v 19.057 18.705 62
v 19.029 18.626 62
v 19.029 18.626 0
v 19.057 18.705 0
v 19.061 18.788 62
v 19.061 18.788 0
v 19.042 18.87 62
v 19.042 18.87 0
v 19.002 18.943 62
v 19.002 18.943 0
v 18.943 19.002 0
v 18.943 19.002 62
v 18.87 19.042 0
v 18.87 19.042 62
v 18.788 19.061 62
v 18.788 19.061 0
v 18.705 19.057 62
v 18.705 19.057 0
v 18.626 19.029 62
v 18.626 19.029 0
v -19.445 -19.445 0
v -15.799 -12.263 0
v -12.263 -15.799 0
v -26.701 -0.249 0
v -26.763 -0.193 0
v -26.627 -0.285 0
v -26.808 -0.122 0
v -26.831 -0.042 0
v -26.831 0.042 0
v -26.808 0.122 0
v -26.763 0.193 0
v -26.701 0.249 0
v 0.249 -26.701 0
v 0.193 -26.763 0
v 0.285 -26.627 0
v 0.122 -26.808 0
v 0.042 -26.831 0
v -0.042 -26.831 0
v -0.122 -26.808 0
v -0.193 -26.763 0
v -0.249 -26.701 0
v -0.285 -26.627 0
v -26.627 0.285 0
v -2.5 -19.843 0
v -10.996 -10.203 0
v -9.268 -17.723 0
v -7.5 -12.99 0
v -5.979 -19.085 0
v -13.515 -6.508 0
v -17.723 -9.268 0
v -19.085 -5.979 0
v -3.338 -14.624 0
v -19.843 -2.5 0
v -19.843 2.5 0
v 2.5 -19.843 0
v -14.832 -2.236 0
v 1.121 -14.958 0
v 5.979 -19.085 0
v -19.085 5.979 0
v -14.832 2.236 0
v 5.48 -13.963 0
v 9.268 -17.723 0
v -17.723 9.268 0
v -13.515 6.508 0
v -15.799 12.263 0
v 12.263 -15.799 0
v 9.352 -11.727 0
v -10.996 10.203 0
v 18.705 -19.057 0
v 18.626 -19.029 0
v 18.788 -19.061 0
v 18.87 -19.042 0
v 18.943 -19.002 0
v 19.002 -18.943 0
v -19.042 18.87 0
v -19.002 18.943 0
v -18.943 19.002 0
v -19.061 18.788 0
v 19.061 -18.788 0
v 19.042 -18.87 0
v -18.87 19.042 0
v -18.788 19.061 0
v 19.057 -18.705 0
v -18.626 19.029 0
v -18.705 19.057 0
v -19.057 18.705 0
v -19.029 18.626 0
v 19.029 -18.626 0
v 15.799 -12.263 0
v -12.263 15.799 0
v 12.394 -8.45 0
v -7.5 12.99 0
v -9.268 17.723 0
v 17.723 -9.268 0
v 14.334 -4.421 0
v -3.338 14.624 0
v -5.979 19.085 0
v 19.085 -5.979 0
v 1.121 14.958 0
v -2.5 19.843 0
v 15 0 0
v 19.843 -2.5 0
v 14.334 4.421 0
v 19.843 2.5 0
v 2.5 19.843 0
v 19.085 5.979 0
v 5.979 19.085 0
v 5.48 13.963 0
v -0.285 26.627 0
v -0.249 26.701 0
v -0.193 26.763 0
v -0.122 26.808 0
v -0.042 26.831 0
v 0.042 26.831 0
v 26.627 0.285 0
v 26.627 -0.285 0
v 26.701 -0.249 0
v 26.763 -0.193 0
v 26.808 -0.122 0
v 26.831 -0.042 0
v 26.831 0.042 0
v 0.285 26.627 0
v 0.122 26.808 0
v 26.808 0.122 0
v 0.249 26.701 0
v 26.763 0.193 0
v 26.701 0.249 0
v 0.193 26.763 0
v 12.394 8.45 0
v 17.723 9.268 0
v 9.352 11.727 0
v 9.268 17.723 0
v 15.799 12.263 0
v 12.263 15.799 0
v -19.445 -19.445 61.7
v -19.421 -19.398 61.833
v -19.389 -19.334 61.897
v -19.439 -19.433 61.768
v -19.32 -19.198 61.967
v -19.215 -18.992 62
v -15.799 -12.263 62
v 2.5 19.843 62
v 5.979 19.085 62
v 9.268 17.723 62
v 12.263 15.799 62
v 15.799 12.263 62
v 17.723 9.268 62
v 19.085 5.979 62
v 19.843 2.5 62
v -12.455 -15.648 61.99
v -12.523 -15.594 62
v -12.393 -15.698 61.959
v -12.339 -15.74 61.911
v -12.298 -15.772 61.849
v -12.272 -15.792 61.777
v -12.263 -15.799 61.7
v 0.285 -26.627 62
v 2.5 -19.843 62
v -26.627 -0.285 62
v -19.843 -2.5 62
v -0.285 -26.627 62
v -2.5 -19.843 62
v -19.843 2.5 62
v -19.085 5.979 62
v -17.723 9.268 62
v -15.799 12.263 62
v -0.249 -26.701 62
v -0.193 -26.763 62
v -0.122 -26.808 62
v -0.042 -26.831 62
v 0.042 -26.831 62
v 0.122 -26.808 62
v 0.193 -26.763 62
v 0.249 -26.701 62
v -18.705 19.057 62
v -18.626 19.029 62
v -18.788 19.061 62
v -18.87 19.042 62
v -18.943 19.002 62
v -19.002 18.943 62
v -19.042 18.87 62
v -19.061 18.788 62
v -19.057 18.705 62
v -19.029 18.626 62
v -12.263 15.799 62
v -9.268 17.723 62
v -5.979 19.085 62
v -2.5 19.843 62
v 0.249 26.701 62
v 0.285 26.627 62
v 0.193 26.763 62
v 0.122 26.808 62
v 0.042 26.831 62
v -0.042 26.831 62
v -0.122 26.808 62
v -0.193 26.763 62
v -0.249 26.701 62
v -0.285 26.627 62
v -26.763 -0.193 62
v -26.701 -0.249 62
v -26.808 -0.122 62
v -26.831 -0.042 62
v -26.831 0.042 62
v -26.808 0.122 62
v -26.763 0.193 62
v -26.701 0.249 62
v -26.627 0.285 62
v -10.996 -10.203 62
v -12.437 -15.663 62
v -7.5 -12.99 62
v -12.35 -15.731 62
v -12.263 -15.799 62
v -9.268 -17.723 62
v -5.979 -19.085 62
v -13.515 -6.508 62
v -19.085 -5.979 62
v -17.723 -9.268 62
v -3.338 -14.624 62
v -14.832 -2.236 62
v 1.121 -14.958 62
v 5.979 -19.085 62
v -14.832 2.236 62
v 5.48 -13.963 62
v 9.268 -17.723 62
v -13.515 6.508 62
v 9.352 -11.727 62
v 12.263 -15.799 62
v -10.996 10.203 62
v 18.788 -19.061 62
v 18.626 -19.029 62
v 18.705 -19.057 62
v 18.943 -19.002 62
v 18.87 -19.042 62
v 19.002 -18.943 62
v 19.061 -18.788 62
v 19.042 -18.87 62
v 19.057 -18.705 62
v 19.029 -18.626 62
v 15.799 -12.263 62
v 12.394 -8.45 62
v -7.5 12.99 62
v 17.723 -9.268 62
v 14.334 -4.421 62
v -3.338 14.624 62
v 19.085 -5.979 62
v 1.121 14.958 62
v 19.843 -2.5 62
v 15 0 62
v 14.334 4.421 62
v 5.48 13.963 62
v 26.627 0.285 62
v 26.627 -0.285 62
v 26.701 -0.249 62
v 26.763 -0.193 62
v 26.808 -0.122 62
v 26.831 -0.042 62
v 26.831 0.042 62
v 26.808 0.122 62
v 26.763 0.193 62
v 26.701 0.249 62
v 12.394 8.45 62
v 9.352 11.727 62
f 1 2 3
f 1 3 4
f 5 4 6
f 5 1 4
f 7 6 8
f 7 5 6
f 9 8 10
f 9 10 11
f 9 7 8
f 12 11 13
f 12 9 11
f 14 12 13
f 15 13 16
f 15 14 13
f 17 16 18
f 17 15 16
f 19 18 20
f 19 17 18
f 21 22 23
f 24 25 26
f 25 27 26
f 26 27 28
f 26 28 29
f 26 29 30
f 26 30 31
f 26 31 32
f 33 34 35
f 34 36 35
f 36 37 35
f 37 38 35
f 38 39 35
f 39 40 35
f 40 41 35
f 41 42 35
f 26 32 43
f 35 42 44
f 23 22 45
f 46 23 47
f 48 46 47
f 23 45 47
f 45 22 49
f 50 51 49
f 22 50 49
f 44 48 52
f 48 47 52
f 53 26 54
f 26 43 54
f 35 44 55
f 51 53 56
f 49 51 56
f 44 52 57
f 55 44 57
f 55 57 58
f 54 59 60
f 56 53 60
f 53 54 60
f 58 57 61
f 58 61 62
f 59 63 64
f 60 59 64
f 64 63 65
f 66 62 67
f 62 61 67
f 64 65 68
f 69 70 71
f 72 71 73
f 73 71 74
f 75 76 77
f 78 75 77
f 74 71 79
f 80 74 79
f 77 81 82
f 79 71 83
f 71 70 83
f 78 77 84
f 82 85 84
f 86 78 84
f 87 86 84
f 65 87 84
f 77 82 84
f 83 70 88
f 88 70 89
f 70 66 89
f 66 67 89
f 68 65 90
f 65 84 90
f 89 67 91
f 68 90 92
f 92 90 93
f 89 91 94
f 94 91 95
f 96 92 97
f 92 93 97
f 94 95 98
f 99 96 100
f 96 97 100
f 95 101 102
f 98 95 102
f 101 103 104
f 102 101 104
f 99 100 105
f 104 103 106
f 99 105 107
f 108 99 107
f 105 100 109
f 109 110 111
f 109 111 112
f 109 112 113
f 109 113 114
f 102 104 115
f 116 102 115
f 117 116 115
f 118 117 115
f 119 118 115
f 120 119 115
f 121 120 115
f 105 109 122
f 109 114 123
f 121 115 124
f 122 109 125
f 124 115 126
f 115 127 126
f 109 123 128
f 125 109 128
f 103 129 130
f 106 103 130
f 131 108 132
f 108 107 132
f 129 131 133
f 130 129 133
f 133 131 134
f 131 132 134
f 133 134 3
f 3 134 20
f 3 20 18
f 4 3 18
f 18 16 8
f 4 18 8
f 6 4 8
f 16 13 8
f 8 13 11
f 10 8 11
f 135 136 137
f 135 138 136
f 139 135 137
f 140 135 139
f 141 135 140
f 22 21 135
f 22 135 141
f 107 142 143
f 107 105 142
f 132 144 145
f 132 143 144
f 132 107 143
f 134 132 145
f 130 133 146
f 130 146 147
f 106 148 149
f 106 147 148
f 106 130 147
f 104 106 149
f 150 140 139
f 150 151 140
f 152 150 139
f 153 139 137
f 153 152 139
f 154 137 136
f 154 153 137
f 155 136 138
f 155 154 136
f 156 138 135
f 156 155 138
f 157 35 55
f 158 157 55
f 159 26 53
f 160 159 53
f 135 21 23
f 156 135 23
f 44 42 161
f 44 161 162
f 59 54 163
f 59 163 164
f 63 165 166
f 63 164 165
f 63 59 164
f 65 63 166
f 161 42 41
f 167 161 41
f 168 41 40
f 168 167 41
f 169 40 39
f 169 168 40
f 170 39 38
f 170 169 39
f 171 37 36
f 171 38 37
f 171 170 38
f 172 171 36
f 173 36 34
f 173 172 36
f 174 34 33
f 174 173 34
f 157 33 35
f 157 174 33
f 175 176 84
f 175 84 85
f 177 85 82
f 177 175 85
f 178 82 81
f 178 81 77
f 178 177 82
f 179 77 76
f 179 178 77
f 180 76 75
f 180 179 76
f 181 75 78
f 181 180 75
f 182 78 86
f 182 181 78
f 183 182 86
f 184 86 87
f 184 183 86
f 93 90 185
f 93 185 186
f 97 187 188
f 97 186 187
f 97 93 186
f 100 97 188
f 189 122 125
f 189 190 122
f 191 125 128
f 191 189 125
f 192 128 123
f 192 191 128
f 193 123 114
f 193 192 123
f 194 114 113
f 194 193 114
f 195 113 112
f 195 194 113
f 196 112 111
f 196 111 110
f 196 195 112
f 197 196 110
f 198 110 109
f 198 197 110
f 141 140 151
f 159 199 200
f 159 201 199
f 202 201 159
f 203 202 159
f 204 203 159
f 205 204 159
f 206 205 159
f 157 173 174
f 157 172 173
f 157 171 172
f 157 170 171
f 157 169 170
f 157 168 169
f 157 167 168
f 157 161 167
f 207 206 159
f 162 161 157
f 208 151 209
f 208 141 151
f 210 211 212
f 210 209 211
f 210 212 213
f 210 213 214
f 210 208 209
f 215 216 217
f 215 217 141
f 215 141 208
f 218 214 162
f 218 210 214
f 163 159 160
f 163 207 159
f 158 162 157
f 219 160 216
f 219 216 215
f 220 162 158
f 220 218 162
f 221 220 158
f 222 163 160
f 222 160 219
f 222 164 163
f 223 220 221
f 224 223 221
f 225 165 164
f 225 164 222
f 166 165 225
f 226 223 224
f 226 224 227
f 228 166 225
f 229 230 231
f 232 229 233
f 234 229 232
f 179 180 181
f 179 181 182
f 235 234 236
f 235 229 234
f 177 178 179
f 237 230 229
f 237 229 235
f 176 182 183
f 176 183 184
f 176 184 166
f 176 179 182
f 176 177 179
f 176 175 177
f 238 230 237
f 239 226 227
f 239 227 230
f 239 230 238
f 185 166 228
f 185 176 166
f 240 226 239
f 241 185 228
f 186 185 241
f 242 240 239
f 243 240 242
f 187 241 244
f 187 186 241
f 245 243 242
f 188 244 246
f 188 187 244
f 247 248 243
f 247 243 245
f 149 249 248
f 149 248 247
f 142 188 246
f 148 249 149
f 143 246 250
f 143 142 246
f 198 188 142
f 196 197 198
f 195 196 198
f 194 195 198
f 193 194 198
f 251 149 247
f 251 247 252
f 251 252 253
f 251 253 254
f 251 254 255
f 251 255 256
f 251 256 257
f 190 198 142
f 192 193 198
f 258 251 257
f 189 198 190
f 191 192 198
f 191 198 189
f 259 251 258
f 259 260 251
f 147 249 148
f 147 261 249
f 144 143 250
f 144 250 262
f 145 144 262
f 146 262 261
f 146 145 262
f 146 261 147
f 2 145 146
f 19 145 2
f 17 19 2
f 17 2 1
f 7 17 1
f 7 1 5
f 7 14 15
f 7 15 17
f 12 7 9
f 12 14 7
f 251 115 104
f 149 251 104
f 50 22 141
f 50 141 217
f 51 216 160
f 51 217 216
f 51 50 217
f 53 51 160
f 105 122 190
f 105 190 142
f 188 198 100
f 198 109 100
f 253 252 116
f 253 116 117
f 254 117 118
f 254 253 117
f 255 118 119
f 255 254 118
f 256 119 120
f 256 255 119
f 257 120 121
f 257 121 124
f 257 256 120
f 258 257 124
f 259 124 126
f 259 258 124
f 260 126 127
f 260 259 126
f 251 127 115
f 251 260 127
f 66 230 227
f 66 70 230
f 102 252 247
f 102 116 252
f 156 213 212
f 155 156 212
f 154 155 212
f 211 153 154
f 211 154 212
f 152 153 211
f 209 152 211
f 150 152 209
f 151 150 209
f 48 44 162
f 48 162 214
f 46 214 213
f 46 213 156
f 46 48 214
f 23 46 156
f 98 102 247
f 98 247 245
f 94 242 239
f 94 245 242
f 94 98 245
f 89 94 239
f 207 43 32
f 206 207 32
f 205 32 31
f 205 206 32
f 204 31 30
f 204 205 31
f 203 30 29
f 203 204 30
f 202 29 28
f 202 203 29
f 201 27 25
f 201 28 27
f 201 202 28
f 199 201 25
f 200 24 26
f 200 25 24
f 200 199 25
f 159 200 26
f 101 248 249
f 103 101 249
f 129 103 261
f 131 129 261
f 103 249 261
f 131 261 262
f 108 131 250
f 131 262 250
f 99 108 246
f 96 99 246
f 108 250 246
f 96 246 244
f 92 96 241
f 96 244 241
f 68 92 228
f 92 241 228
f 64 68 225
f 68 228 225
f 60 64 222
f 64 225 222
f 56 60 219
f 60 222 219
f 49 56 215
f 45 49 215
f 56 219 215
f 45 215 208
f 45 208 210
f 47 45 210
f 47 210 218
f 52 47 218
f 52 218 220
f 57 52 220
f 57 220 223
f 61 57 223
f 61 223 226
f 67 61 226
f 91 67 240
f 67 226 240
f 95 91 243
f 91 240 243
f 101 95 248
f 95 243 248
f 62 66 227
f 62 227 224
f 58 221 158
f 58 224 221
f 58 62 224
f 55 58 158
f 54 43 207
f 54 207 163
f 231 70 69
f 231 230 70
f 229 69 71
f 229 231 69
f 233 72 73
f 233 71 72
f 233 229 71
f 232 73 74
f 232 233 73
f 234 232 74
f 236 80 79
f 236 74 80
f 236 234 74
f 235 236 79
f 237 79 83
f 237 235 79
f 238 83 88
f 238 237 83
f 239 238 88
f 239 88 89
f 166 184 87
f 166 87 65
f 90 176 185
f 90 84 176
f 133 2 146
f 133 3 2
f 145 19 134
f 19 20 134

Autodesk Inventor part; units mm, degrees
ref_plane "YZ Plane" through (0, 0, 0) normal (1, 0, 0) x (0, 1, 0)
ref_plane "XZ Plane" through (0, 0, 0) normal (0, 1, 0) x (-1, 0, 0)
ref_plane "XY Plane" through (0, 0, 0) normal (0, 0, 1) x (1, 0, 0)
sketch "草图1" plane through (0, 0, 0) normal (0, 0, 1) x (1, 0, 0)
  circle A0 centre (0, 0) radius 27.5
  line L0 (27.5, 0) -> (19.8431, 2.5)
  line L1 (0, 0) -> (42.7409, 0) construction
  line L2 (27.5, 0) -> (19.8431, -2.5)
  line L3 (19.4454, 19.4454) -> (12.2634, 15.799)
  line L4 (19.4454, 19.4454) -> (15.799, 12.2634)
  line L5 (0, 27.5) -> (-2.5, 19.8431)
  line L6 (0, 27.5) -> (2.5, 19.8431)
  line L7 (-19.4454, 19.4454) -> (-15.799, 12.2634)
  line L8 (-19.4454, 19.4454) -> (-12.2634, 15.799)
  line L9 (-27.5, 0) -> (-19.8431, -2.5)
  line L10 (-27.5, 0) -> (-19.8431, 2.5)
  line L11 (-19.4454, -19.4454) -> (-12.2634, -15.799)
  line L12 (-19.4454, -19.4454) -> (-15.799, -12.2634)
  line L13 (0, -27.5) -> (2.5, -19.8431)
  line L14 (0, -27.5) -> (-2.5, -19.8431)
  line L15 (19.4454, -19.4454) -> (15.799, -12.2634)
  line L16 (19.4454, -19.4454) -> (12.2634, -15.799)
  arc A1 (19.8431, 2.5) -> (15.799, 12.2634) centre (0, 0) ccw
  arc A2 (15.799, -12.2634) -> (19.8431, -2.5) centre (0, 0) ccw
  arc A3 (2.5, -19.8431) -> (12.2634, -15.799) centre (0, 0) ccw
  arc A4 (-12.2634, -15.799) -> (-2.5, -19.8431) centre (0, 0) ccw
  arc A5 (-19.8431, -2.5) -> (-15.799, -12.2634) centre (0, 0) ccw
  arc A6 (-15.799, 12.2634) -> (-19.8431, 2.5) centre (0, 0) ccw
  arc A7 (12.2634, 15.799) -> (2.5, 19.8431) centre (0, 0) ccw
  arc A8 (-2.5, 19.8431) -> (-12.2634, 15.799) centre (0, 0) ccw
  dimension "d1" = 55
  dimension "d2" = 2.5
  dimension "d5" = 360
extrude "拉伸1" add sketch "草图1" along normal blind 62 contours L2 A2 L15 L16 A3 L13 L14 A4 L11 L12 A5 L9 L10 A6 L7 L8 A8 L5 L6 A7 L3 L4 A1 L0
sketch "草图2" plane through (0, 0, 62) normal (0, 0, 1) x (1, 0, 0)
  circle A0 centre (0, 0) radius 15
  dimension "d9" = 30
extrude "拉伸2" cut sketch "草图2" against normal through all
fillet "圆角1" radius 0.3 8 edges at (19.4454, 19.4454, 31) (0, 27.5, 31) (27.5, 0, 31) (19.4454, -19.4454, 31) (0, -27.5, 31) (-15.8544, -17.6222, 62) (-27.5, 0, 31) (-19.4454, 19.4454, 31)
properties part number "滚轮设计" material "橡胶"
